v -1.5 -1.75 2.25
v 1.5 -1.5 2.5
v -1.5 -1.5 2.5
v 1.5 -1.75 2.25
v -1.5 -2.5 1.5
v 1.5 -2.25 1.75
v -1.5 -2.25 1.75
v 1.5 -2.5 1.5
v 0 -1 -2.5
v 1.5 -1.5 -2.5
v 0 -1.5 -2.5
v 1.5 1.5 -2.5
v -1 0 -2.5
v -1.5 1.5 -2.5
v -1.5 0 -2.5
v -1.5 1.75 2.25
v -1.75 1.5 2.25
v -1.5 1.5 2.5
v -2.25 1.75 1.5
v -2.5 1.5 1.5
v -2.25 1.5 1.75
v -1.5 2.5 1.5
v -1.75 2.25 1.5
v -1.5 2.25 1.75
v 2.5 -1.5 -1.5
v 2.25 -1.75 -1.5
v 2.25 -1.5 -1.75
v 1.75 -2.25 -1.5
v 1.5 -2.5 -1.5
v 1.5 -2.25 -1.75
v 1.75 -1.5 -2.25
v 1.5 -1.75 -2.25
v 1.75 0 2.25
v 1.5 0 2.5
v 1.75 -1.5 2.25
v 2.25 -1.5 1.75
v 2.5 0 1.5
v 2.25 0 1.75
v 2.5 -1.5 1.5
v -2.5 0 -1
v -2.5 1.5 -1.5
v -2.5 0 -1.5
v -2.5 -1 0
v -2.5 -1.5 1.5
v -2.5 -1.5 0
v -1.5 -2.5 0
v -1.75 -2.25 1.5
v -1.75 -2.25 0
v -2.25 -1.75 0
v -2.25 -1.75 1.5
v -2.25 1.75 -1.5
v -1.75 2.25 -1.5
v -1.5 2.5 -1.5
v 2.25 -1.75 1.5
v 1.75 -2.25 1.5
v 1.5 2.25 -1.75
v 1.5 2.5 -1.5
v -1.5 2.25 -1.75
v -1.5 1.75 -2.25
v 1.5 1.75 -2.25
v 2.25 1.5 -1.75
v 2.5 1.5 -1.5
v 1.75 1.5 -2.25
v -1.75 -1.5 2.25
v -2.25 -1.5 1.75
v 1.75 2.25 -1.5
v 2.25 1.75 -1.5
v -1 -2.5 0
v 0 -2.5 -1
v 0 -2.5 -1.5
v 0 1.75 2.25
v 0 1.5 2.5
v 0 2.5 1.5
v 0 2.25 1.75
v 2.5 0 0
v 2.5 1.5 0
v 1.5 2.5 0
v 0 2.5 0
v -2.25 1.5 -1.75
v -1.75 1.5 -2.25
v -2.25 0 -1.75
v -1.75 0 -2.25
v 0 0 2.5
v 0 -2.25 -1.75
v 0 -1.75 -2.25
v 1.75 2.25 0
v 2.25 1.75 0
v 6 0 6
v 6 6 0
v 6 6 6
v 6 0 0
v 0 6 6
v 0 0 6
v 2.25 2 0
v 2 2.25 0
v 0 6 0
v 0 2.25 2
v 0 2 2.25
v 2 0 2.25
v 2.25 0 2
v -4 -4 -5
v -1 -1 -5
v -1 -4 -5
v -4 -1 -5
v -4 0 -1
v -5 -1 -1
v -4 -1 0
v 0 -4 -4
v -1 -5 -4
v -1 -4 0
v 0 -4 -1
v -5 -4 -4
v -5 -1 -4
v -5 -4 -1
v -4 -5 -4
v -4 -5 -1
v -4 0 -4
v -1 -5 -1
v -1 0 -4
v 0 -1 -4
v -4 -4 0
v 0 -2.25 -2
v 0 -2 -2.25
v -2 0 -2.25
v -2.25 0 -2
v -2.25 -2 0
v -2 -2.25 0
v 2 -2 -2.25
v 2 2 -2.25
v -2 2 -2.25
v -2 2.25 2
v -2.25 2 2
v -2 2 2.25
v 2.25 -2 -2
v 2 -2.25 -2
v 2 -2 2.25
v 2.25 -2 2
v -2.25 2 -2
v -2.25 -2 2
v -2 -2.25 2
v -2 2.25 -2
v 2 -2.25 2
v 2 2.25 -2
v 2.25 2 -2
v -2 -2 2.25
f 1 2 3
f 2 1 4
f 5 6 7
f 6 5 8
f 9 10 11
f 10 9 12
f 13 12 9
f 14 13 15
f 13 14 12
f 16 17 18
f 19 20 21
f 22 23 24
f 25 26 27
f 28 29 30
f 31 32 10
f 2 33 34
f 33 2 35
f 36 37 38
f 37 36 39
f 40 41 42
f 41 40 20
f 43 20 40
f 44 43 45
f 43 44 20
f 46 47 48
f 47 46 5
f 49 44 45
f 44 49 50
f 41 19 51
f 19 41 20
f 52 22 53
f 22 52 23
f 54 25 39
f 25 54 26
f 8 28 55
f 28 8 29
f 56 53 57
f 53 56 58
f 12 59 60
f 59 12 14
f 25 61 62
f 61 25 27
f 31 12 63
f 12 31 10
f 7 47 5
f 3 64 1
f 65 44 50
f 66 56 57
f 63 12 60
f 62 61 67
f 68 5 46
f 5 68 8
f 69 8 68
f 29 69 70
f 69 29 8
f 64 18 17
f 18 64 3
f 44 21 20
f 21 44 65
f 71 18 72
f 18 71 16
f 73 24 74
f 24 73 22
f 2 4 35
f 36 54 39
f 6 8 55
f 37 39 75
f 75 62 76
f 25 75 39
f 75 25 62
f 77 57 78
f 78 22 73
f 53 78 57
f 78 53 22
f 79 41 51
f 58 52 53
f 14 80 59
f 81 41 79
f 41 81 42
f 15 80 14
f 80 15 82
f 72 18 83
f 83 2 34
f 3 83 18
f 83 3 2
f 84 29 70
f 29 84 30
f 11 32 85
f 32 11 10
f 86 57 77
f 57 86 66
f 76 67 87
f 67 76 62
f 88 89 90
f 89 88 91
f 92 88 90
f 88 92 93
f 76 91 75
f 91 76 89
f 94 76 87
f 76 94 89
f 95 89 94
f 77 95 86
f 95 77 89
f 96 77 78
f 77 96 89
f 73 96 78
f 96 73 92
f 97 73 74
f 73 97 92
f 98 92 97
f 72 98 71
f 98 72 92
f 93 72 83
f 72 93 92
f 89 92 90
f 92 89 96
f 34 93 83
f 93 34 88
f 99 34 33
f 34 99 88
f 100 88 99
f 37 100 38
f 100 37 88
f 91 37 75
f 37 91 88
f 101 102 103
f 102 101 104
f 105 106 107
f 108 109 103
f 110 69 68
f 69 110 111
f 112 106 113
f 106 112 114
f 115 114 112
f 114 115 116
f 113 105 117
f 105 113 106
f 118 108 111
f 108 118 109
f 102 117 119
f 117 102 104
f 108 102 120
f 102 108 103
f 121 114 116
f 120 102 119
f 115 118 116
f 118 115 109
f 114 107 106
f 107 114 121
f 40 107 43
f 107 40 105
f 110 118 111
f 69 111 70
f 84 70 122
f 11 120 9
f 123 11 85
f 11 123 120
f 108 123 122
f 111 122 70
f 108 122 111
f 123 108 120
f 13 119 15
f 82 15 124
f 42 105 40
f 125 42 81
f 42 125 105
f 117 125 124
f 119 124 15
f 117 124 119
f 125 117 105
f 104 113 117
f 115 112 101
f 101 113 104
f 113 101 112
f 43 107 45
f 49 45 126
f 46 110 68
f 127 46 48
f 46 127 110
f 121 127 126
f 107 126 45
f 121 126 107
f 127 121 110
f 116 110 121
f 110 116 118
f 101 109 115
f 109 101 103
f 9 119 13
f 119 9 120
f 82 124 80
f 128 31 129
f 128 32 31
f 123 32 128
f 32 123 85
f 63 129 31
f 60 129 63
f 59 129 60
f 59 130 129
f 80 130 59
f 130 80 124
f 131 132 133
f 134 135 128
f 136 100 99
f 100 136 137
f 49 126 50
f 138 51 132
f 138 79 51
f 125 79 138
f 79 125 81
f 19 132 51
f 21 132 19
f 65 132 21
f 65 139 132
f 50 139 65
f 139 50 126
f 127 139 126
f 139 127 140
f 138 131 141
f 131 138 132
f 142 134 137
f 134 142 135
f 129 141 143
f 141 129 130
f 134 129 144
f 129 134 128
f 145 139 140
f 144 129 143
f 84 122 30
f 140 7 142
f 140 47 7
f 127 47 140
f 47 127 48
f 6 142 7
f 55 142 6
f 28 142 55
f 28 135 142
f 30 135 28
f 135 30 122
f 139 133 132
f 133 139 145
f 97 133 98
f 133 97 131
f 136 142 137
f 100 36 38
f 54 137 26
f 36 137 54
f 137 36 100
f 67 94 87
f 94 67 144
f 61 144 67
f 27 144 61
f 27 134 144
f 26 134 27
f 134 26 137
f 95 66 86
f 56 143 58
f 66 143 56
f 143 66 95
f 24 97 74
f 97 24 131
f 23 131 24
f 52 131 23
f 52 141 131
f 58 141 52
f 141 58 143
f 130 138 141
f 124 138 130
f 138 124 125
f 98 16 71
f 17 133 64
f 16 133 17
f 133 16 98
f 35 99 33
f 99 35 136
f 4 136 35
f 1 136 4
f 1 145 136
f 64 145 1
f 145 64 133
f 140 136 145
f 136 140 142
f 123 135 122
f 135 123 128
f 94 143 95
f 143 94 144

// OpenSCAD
// file: mutil.scad
module mcenter(center, _size) {

    assert(is_bool(center) || (is_list(center) && len(center) == 3), "center must be 'bool' or 'array[3]'");

    _translate =
        is_bool(center)
        ? [center ? -_size.x / 2 : 0, center ? -_size.y / 2 : 0, center ? -_size.z / 2 : 0]
        : [((center.x / 2) * _size.x) - (_size.x / 2), ((center.y / 2) * _size.y) - (_size.y / 2), ((center.z / 2) * _size.z) -(_size.z / 2)];

    translate(_translate) {
        children();
    }

}


module mcolor(color) {

    if(is_undef(color)) {
        children();
    } else {
        color(color) {
            children();
        }
    }
}



function mlist3(v) = (
    is_num(v)
        ? [v, v, v]
        : v
);
// file: mdefaults.scad
inch = 25.4;

default_outside_radius = inch / 4;

default_wall_thickness = inch / 8;

default_chamfer = default_wall_thickness / 4;

default_size = 10;

default_manifold_overlap = 0.01;
// main file
// BOF

// extends: https://en.wikibooks.org/wiki/OpenSCAD_User_Manual/The_OpenSCAD_Language#cube
// cube(size = [x,y,z], center = true/false);
// cube(size =  x ,     center = true/false);

include <mdefaults.scad>;

use <mutil.scad>;

module mcube(size = default_size, center = false, chamfer = undef, color = undef, manifold_underlap = false, manifold_overlap = false) {

    module cubey(cubey_size, _chamfer) {

        if(is_undef(_chamfer) || _chamfer == 0) {
            cube(cubey_size);
        } else {
            hull() {
                translate([cubey_size.x / 2, cubey_size.y / 2, cubey_size.z / 2]) {
                    cube([cubey_size.x               , cubey_size.y - _chamfer * 2, cubey_size.z - _chamfer * 2], center = true); // x axis
                    cube([cubey_size.x - _chamfer * 2, cubey_size.y               , cubey_size.z - _chamfer * 2], center = true); // y axis
                    cube([cubey_size.x - _chamfer * 2, cubey_size.y - _chamfer * 2, cubey_size.z               ], center = true); // z axis
                }
            }
        }
    }

    
    assert(is_num(size) || (is_list(size) && len(size) == 3), "size must be 'num' or 'array[3]'");
    _size = mlist3(size) + mlist3(manifold_overlap ? default_manifold_overlap : 0) - mlist3(manifold_underlap ? default_manifold_overlap : 0);

    mcenter(center, _size) {
        mcolor(color) {
            cubey(_size, _chamfer = chamfer);
        }
    }

}


// test parts
                mcube(  5,         true, chamfer = 1   , color =  "green");
color("pink")   mcube(  [6,6,6]                                          );
                mcube(  5, [-1, -1, -1], chamfer = 1   , color = "orange");
                mcube(4.5,         true, chamfer = 0.25                  );



// EOF
